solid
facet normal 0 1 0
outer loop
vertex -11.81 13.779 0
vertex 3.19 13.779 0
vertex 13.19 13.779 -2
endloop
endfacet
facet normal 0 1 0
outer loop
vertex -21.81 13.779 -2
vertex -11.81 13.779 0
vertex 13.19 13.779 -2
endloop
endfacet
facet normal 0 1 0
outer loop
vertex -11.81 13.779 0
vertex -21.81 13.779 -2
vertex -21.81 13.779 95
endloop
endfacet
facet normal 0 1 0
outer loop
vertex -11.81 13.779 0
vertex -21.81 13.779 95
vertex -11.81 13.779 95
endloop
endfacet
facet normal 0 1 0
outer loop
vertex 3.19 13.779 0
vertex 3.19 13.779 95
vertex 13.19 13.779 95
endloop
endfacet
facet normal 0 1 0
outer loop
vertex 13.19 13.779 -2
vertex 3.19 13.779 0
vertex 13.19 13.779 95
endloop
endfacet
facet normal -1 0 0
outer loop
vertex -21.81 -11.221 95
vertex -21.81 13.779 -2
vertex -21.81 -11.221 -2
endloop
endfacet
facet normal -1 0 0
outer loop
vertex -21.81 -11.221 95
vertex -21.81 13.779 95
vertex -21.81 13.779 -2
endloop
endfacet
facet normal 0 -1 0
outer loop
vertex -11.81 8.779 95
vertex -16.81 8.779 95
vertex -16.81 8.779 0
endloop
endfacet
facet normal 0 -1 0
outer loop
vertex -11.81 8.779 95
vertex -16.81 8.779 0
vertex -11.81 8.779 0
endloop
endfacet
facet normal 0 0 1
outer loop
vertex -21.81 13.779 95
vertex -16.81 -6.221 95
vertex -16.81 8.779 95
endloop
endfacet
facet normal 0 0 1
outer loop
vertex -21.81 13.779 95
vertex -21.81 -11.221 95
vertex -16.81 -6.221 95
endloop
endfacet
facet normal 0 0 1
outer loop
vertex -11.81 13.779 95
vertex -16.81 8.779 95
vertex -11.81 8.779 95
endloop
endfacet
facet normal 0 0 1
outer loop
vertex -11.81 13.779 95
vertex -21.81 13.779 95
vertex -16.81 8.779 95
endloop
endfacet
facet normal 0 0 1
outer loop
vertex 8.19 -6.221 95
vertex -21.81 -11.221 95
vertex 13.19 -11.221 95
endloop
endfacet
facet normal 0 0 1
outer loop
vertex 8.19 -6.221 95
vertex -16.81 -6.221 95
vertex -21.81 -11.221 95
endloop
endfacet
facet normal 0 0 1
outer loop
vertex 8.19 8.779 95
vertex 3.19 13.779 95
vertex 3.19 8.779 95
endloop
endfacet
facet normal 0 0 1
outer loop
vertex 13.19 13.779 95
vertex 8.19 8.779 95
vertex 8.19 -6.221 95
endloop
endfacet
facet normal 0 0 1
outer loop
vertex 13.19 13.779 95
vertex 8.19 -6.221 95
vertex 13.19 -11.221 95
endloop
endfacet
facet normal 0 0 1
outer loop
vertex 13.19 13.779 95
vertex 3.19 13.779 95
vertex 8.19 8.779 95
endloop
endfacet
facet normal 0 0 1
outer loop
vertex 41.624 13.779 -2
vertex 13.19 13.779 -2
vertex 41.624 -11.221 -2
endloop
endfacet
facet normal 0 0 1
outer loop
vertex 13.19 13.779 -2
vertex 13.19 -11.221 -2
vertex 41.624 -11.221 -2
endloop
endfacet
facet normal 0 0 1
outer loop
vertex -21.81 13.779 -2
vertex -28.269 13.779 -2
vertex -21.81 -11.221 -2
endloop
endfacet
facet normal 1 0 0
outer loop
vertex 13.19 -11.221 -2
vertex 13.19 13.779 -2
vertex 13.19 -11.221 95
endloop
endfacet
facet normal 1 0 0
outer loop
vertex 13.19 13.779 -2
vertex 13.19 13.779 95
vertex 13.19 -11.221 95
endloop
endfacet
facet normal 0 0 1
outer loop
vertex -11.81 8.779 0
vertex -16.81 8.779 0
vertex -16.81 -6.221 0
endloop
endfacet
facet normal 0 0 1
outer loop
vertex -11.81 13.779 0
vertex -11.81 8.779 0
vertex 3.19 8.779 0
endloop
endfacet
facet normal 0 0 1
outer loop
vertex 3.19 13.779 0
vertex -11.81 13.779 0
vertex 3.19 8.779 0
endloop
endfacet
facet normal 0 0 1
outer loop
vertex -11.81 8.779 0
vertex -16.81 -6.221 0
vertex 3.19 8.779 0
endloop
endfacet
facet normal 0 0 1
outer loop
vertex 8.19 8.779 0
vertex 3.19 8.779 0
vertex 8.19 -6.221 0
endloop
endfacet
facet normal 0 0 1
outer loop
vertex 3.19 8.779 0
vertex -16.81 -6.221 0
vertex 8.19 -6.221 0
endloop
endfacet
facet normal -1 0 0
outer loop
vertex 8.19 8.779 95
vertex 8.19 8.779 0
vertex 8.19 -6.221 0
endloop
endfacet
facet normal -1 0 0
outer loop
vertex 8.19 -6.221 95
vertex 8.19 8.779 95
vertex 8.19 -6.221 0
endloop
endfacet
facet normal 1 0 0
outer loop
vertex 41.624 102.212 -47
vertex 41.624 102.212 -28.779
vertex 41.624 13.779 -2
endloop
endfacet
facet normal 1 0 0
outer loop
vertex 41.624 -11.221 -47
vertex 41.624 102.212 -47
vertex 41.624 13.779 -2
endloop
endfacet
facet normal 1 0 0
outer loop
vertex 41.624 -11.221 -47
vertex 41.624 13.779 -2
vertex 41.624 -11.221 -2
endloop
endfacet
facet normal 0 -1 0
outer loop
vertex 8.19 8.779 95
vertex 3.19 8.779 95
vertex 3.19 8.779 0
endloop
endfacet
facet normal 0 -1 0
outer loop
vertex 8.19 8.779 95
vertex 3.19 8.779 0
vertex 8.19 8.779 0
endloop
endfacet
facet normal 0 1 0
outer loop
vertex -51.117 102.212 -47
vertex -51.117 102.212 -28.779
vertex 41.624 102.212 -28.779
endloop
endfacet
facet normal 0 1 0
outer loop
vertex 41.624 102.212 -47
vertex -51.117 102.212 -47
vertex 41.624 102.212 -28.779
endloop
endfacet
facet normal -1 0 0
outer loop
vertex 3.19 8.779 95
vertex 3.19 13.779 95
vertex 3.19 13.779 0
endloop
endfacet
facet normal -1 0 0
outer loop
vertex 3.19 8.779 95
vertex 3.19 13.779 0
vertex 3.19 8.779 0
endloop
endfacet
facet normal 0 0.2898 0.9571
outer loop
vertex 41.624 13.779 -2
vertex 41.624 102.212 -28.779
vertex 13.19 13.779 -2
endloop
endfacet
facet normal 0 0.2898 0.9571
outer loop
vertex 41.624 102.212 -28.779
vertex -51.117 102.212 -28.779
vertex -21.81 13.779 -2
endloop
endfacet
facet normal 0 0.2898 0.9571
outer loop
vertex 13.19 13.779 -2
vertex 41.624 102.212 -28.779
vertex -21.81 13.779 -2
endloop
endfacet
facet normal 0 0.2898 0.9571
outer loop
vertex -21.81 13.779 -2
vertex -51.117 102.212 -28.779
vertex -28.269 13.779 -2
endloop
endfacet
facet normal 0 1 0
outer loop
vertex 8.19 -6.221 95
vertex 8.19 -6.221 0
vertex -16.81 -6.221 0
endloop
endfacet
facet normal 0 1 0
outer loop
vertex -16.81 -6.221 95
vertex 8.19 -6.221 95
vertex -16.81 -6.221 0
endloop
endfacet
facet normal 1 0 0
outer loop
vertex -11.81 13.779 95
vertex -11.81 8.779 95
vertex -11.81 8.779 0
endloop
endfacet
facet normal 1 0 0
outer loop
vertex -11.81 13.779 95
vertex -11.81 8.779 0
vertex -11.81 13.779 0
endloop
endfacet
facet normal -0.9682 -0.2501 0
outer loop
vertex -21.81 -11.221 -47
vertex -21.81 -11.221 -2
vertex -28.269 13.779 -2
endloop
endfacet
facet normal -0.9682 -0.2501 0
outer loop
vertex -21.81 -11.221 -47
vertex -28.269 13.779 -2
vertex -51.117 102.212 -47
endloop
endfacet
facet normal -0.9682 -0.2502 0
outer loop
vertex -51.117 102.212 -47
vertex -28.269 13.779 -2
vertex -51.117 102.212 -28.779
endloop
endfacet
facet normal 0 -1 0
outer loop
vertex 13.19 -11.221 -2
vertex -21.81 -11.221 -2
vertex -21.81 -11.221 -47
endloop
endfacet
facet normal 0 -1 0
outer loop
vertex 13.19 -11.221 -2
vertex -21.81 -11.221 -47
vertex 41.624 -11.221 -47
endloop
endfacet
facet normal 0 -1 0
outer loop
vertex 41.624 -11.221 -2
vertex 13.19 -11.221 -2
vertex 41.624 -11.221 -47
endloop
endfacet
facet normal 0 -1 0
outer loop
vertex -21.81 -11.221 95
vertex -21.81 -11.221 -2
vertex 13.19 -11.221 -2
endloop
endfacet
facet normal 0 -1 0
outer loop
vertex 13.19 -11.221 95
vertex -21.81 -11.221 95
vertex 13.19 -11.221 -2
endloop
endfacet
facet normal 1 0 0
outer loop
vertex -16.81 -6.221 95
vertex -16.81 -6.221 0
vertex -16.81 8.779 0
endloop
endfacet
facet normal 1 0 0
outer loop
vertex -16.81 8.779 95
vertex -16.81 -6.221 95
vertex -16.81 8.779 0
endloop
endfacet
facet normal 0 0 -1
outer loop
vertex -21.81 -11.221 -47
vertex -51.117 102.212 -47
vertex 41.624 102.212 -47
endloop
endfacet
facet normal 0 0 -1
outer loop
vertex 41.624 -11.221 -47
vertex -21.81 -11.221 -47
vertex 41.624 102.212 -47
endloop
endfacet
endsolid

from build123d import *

# Parameters (mm, degrees)
F1_DEPTH  = 95
F2_W      = 35
F2_H      = 25
F3_DEPTH  = 2
F4_W      = 92.7402563393
F4_H      = 113.4333282709
F5_DEPTH  = 45
F7_DEPTH  = 92.7402563393
F10_DEPTH = 47.8


with BuildPart() as f1:
    # F0 (on Top) → F1 (new body)
    with BuildSketch(Plane.XY):
        Polygon((-21.8103982317, -11.2208545208), (13.1896017683, -11.2208545208), (13.1896017683, 13.7791454792), (3.1896017683, 13.7791454792), (3.1896017683, 8.7791454792), (8.1896017683, 8.7791454792), (8.1896017683, -6.2208545208), (-16.8103982317, -6.2208545208), (-16.8103982317, 8.7791454792), (-11.8103982317, 8.7791454792), (-11.8103982317, 13.7791454792), (-21.8103982317, 13.7791454792), align=None)
    extrude(amount=F1_DEPTH)

    # F2 (on face) → F3 (join)
    with BuildSketch(Plane(origin=(0, 0, 0), x_dir=(1, 0, 0), z_dir=(0, 0, -1))):
        with Locations((-4.3103982317, -1.2791454792)):
            Rectangle(F2_W, F2_H)
    extrude(amount=F3_DEPTH)

    # F4 (on face) → F5 (join)
    with BuildSketch(Plane(origin=(0, 0, -2), x_dir=(1, 0, 0), z_dir=(0, 0, -1))):
        with Locations((-4.7465320677, -45.4958096147)):
            Rectangle(F4_W, F4_H)
    extrude(amount=F5_DEPTH)

    # F6 (on face) → F7 (cut, through all)
    with BuildSketch(Plane(origin=(-51.1166602373, 0, 0), x_dir=(0, -1, 0), z_dir=(-1, 0, 0))):
        Polygon((-102.2124737501, -28.7785492837), (-13.7791454792, -2), (-102.2124737501, -2), align=None)
    extrude(amount=-F7_DEPTH, mode=Mode.SUBTRACT)

    # F9 (on 3pt) → F10 (cut)
    with BuildSketch(Plane(origin=(-23.1632746384, -5.9843875324, 0), x_dir=(-0.2501432541, 0.9682088372, 0), z_dir=(0.9682088372, 0.2501432541, 0))):
        Polygon((111.7495080876, 32.3685184121), (-5.4084065206, -2), (-6.0562286526, -47), (111.7495080876, -47), align=None)
    extrude(amount=-F10_DEPTH, mode=Mode.SUBTRACT)


solid = f1.part
